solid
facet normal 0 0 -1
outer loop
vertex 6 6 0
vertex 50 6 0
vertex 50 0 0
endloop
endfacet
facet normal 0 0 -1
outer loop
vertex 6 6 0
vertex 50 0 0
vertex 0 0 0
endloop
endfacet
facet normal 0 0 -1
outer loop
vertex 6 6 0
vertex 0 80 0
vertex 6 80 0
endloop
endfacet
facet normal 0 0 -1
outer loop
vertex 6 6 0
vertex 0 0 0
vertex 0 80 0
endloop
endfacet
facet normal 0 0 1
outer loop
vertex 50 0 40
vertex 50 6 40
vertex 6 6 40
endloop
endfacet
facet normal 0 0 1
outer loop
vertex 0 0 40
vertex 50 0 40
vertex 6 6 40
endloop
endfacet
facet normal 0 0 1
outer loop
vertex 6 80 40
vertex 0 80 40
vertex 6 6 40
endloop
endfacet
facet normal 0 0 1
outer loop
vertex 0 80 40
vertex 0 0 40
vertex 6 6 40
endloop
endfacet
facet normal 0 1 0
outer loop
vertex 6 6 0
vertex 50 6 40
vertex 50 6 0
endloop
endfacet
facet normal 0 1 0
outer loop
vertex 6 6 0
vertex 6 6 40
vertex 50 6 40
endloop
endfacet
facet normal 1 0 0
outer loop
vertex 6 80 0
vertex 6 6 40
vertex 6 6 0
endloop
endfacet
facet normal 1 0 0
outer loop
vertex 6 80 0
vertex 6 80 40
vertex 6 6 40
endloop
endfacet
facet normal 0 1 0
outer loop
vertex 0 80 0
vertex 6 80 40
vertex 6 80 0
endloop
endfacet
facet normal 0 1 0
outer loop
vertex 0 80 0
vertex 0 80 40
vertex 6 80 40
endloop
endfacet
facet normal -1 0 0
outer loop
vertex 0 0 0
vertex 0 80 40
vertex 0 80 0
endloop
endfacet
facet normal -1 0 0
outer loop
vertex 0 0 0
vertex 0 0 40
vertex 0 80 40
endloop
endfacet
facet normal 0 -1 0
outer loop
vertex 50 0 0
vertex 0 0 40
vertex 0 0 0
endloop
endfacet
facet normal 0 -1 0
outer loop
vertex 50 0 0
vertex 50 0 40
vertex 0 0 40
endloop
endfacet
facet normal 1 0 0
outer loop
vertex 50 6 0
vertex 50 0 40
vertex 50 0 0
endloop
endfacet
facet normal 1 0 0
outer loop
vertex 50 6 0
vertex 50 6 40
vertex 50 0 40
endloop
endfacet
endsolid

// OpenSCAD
$fn = 32;

// ----------------------------------------------------------------------
// Structural section: angle 50 x 80 mm
// ----------------------------------------------------------------------

// --- parameters (mm) ---
sec_w = 50;               // leg width, X
sec_h = 80;               // leg height, Y
flange_t = 6;             // leg thickness
plate_t = 40;             // cut length, Z (extrusion height)
fit_tol = 0.05;           // declared fit tolerance (prompt contract)
free_tol = 0.2;           // declared free tolerance (prompt contract)

profile = [[0, 0], [50, 0], [50, 6], [6, 6], [6, 80], [0, 80]];  // primary outline, 6 points, counter clockwise

// --- the one profile operation ---
linear_extrude(height = plate_t) polygon(points = profile);
